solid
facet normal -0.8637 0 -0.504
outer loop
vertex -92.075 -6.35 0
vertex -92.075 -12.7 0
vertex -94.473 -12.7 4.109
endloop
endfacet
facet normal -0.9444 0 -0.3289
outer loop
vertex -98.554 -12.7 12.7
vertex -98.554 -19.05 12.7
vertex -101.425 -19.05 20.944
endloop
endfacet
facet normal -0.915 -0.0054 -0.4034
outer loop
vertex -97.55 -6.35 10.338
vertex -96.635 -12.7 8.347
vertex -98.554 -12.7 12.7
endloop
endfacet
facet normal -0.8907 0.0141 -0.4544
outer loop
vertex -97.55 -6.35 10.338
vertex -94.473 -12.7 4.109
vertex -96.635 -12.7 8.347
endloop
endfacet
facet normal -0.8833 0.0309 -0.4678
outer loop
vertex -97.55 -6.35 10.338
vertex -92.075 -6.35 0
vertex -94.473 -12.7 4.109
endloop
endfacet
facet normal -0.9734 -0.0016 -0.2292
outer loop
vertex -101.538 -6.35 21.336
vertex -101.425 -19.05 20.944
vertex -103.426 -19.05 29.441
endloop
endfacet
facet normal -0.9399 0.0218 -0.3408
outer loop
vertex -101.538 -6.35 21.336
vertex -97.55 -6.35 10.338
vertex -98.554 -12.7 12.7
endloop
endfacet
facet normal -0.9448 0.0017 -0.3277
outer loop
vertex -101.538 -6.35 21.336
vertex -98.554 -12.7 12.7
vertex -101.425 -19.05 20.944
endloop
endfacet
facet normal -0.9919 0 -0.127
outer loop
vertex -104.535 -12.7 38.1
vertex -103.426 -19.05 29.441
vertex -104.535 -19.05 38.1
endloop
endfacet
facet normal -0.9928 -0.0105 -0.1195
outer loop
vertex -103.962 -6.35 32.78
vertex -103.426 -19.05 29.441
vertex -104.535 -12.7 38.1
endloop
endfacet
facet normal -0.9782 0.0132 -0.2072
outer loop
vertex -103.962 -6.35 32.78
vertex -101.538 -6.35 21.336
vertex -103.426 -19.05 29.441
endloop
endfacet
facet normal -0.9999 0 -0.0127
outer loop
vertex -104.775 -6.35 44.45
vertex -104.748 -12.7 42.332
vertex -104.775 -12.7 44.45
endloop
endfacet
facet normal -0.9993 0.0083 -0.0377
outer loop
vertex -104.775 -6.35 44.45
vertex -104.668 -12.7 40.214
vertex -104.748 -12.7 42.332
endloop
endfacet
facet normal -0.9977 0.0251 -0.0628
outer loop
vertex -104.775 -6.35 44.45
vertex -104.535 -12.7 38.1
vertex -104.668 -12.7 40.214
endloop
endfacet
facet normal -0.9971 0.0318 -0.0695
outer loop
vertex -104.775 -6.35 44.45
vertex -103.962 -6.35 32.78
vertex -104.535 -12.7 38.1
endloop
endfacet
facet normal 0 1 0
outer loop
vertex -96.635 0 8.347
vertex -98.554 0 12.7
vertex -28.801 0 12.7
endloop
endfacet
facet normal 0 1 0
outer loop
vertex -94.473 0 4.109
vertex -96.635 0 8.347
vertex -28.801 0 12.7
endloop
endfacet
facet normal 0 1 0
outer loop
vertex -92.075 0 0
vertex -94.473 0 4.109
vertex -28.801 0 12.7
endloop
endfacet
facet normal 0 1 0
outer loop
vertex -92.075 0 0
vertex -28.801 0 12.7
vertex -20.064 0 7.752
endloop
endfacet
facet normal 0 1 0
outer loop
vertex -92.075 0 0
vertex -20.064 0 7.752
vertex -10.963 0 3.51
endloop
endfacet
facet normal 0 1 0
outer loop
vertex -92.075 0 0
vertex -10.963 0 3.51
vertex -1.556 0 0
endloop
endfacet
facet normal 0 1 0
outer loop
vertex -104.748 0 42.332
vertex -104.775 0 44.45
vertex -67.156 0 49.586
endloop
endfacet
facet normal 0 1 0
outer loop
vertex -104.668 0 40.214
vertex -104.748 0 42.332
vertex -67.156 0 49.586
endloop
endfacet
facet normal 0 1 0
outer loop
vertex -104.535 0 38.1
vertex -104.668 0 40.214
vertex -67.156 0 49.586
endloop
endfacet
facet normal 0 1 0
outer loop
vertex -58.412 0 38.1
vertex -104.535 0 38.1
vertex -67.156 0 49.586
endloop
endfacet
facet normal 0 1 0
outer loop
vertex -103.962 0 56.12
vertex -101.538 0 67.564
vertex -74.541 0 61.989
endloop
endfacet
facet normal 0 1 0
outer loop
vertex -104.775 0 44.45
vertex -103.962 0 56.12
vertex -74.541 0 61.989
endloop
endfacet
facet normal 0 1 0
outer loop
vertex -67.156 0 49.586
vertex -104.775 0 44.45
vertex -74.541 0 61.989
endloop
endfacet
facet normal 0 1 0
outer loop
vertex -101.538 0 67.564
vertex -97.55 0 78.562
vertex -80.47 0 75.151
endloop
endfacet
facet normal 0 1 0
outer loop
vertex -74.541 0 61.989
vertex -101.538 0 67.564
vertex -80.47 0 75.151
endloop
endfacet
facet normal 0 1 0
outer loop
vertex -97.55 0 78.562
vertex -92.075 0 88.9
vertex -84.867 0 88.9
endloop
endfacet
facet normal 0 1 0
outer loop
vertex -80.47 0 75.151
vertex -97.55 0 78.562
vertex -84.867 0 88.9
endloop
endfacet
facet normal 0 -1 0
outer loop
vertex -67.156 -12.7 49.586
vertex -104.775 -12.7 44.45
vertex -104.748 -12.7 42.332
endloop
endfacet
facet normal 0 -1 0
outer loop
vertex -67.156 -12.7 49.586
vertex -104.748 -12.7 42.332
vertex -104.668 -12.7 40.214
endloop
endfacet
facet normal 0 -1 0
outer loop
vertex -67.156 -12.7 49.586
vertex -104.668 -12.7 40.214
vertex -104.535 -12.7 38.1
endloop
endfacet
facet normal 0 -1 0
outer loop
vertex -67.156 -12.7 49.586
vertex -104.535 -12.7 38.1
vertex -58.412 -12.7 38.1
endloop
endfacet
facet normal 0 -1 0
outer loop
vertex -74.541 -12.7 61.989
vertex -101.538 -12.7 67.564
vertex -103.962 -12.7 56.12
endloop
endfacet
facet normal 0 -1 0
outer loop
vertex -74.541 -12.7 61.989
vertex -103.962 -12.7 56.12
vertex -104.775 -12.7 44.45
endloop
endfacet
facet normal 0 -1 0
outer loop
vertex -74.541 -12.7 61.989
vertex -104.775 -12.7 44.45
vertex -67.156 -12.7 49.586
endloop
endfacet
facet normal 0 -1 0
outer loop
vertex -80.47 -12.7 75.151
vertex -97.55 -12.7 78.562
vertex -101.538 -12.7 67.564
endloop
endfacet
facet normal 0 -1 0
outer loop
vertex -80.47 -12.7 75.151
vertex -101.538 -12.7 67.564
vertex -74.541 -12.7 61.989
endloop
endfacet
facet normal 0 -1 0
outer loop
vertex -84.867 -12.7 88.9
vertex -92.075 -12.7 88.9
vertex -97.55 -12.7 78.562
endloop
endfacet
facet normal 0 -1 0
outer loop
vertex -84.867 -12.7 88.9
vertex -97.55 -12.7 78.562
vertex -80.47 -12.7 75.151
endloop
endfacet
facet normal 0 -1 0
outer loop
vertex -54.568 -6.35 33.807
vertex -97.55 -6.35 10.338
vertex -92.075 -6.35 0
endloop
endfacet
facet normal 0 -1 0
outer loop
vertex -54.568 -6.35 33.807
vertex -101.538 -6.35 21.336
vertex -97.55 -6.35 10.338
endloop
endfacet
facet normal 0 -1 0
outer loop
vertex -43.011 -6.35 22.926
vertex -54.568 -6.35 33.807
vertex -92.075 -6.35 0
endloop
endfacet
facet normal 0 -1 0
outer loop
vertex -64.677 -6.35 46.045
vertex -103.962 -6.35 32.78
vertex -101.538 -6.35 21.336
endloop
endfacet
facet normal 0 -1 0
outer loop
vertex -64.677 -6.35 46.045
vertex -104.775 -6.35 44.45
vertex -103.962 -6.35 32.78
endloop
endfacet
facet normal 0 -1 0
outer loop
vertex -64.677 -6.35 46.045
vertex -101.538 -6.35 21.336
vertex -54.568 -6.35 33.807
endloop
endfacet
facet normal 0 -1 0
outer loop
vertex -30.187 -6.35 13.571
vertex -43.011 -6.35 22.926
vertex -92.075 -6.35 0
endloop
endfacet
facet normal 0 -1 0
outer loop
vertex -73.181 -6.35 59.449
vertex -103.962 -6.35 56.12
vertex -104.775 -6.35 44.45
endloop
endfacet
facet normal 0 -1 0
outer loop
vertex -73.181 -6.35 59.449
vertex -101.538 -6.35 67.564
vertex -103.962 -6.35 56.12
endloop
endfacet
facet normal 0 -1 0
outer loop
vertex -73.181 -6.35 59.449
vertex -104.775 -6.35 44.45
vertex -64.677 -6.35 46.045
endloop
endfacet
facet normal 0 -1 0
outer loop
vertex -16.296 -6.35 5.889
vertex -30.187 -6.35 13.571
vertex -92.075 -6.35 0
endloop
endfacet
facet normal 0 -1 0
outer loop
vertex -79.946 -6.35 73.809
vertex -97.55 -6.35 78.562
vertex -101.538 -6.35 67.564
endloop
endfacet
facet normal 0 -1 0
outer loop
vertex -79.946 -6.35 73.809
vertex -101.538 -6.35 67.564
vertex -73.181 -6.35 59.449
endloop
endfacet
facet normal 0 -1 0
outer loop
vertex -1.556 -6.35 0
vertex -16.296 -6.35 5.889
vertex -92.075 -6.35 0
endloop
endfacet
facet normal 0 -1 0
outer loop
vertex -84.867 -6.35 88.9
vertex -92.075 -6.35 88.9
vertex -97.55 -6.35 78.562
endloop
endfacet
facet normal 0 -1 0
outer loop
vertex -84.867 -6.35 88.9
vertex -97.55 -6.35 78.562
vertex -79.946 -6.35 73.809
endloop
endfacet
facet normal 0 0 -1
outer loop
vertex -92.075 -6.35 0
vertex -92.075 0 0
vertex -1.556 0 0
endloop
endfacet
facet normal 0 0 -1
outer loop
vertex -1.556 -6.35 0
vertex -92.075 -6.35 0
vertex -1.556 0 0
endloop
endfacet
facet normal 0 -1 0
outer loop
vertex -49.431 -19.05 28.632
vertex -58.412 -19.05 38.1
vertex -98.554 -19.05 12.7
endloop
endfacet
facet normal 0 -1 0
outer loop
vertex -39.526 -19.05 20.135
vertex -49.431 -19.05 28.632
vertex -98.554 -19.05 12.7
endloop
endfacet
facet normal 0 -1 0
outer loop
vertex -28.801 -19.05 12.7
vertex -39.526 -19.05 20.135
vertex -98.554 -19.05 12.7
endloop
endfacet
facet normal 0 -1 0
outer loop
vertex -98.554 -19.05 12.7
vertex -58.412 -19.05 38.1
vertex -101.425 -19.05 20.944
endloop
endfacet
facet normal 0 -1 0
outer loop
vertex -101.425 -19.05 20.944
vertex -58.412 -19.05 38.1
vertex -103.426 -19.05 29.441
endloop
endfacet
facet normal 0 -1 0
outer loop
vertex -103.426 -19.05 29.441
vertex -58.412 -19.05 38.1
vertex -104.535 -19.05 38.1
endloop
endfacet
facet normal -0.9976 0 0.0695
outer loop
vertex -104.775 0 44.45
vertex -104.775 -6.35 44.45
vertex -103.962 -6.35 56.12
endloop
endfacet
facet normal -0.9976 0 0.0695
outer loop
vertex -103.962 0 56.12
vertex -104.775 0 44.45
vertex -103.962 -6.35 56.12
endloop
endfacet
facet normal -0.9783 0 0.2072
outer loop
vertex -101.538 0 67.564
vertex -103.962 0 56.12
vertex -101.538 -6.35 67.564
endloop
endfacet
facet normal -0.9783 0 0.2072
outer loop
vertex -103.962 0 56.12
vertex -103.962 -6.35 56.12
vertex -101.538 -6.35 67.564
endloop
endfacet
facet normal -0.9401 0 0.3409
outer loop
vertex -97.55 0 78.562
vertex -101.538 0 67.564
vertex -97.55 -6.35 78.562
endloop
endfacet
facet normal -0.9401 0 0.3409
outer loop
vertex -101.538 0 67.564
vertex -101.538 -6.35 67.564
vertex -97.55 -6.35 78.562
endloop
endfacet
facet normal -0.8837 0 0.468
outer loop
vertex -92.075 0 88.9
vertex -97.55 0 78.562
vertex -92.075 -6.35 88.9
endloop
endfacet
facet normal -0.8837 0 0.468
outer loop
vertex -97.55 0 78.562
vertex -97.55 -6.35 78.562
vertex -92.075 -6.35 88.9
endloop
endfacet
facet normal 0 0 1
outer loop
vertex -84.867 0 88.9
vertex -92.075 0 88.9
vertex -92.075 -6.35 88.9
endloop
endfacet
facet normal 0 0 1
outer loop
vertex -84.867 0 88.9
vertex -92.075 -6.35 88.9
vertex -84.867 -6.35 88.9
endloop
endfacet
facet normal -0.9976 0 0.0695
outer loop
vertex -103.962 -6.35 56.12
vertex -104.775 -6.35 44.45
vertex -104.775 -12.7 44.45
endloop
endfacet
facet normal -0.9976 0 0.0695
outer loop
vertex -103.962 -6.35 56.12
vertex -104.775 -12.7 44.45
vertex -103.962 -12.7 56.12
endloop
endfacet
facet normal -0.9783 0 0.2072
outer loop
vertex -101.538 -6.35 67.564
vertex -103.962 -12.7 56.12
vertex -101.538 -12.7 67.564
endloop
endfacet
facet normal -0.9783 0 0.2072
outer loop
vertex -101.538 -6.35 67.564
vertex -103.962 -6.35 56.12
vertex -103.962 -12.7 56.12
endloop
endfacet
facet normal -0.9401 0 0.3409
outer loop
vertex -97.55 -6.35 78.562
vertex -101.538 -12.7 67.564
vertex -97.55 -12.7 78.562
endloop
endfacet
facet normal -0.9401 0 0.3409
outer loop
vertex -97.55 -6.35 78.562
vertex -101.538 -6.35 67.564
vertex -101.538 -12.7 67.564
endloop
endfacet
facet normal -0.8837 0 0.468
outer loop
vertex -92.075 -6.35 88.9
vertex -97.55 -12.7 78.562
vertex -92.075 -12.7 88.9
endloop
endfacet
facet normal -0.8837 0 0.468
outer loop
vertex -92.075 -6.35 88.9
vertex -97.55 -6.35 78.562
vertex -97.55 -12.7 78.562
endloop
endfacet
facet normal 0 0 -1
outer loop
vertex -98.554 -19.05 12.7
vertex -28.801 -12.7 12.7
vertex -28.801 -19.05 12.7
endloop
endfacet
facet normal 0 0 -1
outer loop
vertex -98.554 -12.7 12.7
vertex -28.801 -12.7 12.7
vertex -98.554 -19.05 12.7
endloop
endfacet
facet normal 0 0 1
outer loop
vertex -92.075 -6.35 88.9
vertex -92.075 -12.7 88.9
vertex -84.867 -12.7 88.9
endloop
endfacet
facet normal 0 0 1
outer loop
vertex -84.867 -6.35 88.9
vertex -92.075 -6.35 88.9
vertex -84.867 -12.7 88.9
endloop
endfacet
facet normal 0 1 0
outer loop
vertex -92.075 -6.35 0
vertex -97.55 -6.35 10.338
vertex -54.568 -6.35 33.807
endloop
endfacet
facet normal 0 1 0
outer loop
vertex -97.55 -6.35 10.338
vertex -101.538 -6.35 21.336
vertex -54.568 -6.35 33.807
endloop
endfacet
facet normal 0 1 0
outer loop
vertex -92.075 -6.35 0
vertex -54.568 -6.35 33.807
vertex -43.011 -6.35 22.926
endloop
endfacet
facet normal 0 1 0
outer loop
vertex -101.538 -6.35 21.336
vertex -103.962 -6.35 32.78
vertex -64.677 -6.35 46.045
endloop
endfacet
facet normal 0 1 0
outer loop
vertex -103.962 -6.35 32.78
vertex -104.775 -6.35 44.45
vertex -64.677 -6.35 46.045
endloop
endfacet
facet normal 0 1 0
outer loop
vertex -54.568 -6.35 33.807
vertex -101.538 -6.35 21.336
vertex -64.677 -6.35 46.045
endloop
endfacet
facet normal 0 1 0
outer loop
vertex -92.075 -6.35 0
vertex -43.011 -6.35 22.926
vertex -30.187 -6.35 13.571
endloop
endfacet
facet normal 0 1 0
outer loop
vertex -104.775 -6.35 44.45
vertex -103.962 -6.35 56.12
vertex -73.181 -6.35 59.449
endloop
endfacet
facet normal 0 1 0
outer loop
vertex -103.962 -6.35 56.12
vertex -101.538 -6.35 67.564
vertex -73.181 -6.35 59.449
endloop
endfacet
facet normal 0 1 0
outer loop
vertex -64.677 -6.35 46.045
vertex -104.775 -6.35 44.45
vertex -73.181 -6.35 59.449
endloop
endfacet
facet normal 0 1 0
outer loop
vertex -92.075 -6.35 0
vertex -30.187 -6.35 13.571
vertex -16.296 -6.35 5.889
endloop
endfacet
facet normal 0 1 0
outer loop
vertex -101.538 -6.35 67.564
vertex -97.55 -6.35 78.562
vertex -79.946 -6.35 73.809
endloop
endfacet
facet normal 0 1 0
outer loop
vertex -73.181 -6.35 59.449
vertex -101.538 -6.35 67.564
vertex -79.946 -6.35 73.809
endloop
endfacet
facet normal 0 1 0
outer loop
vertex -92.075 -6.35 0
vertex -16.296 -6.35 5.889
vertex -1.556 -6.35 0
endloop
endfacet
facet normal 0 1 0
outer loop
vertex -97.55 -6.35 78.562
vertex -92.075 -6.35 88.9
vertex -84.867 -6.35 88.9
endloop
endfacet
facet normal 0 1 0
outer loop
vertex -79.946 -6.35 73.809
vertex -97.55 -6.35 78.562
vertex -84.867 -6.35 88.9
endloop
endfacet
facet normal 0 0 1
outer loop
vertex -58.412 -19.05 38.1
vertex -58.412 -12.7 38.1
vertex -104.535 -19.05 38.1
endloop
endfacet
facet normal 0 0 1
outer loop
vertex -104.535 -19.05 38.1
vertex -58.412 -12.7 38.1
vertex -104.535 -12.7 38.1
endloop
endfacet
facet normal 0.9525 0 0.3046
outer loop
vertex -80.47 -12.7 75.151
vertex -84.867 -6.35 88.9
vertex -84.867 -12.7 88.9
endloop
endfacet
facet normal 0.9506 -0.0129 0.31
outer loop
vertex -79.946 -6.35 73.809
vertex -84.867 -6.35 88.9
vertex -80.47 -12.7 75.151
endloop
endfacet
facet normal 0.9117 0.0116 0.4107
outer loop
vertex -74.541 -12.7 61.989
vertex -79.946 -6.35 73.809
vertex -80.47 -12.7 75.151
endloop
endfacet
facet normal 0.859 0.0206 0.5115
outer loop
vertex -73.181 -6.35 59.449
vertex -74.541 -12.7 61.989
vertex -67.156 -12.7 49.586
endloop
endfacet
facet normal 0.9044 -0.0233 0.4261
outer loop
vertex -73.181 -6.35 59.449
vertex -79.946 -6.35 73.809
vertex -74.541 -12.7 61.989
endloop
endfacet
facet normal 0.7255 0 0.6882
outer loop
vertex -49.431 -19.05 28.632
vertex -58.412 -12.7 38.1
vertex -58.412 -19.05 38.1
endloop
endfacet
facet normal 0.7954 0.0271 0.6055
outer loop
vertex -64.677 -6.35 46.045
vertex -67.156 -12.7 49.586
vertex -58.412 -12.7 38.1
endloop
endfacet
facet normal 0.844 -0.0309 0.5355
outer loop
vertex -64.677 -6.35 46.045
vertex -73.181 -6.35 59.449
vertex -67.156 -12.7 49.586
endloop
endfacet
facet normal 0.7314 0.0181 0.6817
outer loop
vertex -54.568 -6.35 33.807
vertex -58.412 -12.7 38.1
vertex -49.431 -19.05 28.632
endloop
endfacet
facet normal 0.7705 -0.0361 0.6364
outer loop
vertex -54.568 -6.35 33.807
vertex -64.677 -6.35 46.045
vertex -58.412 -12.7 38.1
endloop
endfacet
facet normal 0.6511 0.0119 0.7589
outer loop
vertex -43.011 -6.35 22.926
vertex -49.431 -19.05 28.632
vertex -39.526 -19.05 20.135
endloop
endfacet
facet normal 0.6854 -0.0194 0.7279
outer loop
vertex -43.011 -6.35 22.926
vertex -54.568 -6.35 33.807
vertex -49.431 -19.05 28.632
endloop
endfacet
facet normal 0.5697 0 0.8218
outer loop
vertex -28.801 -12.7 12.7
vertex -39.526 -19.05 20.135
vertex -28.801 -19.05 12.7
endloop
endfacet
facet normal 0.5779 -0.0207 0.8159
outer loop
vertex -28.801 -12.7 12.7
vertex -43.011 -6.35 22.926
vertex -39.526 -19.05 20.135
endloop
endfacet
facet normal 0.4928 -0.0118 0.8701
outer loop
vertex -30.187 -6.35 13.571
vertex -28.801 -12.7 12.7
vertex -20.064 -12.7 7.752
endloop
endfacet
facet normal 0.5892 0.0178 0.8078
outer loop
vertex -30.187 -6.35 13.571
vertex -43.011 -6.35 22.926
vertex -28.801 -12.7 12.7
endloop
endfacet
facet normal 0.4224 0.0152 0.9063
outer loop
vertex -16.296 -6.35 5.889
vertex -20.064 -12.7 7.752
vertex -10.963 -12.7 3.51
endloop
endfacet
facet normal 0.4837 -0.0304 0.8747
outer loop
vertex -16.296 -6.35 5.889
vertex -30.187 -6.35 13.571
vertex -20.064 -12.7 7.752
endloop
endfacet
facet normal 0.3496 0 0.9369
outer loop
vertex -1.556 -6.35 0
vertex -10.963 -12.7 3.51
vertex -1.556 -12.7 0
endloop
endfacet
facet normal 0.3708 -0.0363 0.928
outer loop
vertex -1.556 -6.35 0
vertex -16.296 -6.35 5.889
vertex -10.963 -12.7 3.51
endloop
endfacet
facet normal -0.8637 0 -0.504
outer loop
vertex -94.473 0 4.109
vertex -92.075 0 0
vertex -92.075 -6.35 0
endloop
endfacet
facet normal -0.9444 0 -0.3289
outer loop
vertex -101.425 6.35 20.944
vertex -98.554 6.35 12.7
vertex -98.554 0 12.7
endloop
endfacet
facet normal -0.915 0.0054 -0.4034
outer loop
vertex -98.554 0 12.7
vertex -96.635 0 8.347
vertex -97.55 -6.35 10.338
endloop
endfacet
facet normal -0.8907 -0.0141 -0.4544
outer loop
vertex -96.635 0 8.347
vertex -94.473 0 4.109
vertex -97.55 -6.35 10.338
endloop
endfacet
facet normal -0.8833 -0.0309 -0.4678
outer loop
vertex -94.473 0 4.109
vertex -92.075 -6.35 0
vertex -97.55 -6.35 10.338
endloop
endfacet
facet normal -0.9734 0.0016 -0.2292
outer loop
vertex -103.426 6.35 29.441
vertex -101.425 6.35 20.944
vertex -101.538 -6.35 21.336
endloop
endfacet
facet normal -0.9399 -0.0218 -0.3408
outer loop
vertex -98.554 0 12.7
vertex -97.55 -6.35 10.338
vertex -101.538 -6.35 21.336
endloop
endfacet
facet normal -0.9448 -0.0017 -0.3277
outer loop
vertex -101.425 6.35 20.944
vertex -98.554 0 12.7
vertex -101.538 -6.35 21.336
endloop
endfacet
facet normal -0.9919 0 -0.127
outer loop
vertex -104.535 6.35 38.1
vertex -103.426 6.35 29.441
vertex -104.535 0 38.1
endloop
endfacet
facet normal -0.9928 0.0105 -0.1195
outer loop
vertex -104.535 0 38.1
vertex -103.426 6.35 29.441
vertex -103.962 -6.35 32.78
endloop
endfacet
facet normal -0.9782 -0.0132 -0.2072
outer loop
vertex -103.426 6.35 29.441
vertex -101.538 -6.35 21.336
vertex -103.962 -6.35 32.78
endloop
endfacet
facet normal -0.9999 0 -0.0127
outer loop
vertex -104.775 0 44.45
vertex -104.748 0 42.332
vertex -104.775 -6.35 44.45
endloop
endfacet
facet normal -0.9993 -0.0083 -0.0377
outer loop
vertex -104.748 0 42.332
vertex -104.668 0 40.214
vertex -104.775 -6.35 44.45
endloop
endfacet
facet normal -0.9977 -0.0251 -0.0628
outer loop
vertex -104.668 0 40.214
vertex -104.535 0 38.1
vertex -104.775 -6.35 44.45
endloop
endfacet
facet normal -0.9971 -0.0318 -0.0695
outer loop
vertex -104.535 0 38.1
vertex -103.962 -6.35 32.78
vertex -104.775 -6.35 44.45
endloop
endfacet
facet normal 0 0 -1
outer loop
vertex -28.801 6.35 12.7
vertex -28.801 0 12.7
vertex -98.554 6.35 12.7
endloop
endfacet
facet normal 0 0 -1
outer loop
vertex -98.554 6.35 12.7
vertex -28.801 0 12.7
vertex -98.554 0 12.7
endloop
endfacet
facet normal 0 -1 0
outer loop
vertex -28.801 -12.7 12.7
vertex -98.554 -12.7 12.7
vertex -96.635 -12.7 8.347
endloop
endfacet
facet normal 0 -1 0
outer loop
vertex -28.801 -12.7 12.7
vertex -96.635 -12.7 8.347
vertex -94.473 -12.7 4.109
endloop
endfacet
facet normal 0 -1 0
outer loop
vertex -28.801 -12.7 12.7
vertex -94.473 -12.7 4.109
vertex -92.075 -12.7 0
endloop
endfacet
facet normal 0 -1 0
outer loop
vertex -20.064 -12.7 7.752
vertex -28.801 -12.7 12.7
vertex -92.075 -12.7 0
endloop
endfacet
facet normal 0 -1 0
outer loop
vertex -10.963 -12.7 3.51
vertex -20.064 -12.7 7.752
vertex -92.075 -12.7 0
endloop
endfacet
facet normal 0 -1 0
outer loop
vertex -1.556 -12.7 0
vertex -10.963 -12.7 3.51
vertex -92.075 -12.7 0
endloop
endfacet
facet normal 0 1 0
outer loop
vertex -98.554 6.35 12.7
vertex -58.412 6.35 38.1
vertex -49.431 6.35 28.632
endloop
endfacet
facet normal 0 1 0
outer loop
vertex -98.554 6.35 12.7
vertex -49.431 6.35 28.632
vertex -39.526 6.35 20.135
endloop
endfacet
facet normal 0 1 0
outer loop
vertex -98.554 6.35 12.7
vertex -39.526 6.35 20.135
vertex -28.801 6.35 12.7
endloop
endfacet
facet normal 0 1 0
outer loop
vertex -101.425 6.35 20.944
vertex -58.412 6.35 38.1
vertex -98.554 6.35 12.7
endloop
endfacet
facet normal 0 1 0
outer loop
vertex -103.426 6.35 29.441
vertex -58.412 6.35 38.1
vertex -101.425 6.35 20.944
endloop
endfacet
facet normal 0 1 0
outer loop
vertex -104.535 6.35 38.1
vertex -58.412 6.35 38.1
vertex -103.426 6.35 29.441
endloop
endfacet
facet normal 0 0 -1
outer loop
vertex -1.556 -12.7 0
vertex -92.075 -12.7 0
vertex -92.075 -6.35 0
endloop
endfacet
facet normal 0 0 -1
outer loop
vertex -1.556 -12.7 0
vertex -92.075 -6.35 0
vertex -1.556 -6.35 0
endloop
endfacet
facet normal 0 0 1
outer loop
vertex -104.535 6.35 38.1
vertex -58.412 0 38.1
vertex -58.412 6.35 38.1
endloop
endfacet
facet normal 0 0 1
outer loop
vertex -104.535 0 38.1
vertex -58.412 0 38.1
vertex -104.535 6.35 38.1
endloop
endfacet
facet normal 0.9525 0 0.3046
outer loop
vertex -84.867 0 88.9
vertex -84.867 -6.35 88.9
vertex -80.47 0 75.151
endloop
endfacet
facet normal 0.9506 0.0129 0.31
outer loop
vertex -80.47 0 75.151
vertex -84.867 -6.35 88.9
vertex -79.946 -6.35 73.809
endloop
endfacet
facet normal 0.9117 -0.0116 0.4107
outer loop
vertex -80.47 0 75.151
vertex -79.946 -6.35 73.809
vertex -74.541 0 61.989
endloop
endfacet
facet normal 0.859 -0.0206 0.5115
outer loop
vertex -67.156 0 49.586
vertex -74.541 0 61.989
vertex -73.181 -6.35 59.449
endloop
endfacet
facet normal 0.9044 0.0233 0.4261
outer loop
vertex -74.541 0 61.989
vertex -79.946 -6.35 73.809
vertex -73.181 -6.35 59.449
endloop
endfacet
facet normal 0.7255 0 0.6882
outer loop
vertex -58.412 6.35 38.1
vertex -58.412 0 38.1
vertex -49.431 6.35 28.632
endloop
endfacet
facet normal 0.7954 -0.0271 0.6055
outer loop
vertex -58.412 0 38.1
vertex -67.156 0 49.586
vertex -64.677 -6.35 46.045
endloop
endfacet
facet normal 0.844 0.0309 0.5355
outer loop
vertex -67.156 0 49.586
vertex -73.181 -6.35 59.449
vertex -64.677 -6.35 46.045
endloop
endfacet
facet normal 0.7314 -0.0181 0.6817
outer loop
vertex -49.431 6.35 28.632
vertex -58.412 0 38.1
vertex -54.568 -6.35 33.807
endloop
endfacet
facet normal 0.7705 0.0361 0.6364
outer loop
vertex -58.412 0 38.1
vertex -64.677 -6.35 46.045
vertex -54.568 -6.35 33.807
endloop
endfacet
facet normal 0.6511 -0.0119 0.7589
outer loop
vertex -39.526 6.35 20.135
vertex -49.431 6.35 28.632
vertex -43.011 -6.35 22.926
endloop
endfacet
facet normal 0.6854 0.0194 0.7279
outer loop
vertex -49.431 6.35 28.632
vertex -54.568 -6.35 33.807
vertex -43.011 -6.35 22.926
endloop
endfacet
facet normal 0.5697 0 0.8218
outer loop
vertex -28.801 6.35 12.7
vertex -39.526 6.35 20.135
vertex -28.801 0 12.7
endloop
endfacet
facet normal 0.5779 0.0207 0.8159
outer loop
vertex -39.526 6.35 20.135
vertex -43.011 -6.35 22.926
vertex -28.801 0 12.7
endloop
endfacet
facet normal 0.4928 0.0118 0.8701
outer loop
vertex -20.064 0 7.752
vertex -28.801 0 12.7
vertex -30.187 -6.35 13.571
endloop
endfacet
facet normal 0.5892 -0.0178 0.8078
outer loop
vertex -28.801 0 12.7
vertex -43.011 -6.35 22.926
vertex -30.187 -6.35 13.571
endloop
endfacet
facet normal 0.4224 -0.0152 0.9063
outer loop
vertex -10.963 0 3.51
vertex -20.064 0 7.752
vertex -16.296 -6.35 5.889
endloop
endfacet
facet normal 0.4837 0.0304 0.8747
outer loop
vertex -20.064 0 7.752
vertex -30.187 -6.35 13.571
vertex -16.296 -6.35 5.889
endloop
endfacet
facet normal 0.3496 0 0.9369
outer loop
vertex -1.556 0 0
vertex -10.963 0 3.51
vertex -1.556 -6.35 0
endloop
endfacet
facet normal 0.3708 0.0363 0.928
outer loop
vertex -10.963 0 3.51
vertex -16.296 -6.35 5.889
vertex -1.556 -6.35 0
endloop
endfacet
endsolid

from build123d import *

# Parameters (mm, degrees)
F0_W     = 104.775
F0_H     = 88.9
F1_DEPTH = 6.35
F2_W     = 104.775
F2_H     = 25.4
F3_DEPTH = 6.35
F5_DEPTH = 254
F7_DEPTH = 25.4


with BuildPart() as f1:
    # F0 (on Front) → F1 (new body)
    with BuildSketch(Plane.XZ):
        with Locations((-52.3875, 44.45)):
            Rectangle(F0_W, F0_H)
    extrude(amount=F1_DEPTH)

    # F2 (on face) → F3 (join)
    with BuildSketch(Plane(origin=(0, 0, 0), x_dir=(-1, 0, 0), z_dir=(0, 1, 0))):
        with Locations((52.3875, 25.4)):
            Rectangle(F2_W, F2_H)
    extrude(amount=F3_DEPTH)

    # F4 (on face) → F5 (cut)
    with BuildSketch(Plane.XZ.offset(6.35)):
        with BuildLine():
            ThreePointArc((-104.775, 44.45), (-101.537721, 67.564349), (-92.075, 88.9))
            Line((-92.075, 88.9), (-104.775, 88.9))
            Line((-104.775, 88.9), (-104.775, 44.45))
        make_face()
        with BuildLine():
            ThreePointArc((-92.075, 0), (-101.537721, 21.335651), (-104.775, 44.45))
            Line((-104.775, 44.45), (-104.775, 0))
            Line((-104.775, 0), (-92.075, 0))
        make_face()
    extrude(amount=-F5_DEPTH, mode=Mode.SUBTRACT)

    # F6 (on face) → F7 (cut)
    with BuildSketch(Plane.XZ.offset(6.35)):
        with BuildLine():
            ThreePointArc((-84.867221, 88.9), (-54.568005, 33.807379), (-1.555737, 0))
            Line((-1.555737, 0), (0, 0))
            Line((0, 0), (0, 88.9))
            Line((0, 88.9), (-84.867221, 88.9))
        make_face()
    extrude(amount=-F7_DEPTH, mode=Mode.SUBTRACT)


with BuildPart() as f8_1:
    # F8: instance of F1
    add(f1.part.mirror(Plane(origin=(-73.474778, -6.35, 31.549157), x_dir=(1, 0, 0), z_dir=(0, -1, 0))))


solid = Compound([f1.part, f8_1.part])
